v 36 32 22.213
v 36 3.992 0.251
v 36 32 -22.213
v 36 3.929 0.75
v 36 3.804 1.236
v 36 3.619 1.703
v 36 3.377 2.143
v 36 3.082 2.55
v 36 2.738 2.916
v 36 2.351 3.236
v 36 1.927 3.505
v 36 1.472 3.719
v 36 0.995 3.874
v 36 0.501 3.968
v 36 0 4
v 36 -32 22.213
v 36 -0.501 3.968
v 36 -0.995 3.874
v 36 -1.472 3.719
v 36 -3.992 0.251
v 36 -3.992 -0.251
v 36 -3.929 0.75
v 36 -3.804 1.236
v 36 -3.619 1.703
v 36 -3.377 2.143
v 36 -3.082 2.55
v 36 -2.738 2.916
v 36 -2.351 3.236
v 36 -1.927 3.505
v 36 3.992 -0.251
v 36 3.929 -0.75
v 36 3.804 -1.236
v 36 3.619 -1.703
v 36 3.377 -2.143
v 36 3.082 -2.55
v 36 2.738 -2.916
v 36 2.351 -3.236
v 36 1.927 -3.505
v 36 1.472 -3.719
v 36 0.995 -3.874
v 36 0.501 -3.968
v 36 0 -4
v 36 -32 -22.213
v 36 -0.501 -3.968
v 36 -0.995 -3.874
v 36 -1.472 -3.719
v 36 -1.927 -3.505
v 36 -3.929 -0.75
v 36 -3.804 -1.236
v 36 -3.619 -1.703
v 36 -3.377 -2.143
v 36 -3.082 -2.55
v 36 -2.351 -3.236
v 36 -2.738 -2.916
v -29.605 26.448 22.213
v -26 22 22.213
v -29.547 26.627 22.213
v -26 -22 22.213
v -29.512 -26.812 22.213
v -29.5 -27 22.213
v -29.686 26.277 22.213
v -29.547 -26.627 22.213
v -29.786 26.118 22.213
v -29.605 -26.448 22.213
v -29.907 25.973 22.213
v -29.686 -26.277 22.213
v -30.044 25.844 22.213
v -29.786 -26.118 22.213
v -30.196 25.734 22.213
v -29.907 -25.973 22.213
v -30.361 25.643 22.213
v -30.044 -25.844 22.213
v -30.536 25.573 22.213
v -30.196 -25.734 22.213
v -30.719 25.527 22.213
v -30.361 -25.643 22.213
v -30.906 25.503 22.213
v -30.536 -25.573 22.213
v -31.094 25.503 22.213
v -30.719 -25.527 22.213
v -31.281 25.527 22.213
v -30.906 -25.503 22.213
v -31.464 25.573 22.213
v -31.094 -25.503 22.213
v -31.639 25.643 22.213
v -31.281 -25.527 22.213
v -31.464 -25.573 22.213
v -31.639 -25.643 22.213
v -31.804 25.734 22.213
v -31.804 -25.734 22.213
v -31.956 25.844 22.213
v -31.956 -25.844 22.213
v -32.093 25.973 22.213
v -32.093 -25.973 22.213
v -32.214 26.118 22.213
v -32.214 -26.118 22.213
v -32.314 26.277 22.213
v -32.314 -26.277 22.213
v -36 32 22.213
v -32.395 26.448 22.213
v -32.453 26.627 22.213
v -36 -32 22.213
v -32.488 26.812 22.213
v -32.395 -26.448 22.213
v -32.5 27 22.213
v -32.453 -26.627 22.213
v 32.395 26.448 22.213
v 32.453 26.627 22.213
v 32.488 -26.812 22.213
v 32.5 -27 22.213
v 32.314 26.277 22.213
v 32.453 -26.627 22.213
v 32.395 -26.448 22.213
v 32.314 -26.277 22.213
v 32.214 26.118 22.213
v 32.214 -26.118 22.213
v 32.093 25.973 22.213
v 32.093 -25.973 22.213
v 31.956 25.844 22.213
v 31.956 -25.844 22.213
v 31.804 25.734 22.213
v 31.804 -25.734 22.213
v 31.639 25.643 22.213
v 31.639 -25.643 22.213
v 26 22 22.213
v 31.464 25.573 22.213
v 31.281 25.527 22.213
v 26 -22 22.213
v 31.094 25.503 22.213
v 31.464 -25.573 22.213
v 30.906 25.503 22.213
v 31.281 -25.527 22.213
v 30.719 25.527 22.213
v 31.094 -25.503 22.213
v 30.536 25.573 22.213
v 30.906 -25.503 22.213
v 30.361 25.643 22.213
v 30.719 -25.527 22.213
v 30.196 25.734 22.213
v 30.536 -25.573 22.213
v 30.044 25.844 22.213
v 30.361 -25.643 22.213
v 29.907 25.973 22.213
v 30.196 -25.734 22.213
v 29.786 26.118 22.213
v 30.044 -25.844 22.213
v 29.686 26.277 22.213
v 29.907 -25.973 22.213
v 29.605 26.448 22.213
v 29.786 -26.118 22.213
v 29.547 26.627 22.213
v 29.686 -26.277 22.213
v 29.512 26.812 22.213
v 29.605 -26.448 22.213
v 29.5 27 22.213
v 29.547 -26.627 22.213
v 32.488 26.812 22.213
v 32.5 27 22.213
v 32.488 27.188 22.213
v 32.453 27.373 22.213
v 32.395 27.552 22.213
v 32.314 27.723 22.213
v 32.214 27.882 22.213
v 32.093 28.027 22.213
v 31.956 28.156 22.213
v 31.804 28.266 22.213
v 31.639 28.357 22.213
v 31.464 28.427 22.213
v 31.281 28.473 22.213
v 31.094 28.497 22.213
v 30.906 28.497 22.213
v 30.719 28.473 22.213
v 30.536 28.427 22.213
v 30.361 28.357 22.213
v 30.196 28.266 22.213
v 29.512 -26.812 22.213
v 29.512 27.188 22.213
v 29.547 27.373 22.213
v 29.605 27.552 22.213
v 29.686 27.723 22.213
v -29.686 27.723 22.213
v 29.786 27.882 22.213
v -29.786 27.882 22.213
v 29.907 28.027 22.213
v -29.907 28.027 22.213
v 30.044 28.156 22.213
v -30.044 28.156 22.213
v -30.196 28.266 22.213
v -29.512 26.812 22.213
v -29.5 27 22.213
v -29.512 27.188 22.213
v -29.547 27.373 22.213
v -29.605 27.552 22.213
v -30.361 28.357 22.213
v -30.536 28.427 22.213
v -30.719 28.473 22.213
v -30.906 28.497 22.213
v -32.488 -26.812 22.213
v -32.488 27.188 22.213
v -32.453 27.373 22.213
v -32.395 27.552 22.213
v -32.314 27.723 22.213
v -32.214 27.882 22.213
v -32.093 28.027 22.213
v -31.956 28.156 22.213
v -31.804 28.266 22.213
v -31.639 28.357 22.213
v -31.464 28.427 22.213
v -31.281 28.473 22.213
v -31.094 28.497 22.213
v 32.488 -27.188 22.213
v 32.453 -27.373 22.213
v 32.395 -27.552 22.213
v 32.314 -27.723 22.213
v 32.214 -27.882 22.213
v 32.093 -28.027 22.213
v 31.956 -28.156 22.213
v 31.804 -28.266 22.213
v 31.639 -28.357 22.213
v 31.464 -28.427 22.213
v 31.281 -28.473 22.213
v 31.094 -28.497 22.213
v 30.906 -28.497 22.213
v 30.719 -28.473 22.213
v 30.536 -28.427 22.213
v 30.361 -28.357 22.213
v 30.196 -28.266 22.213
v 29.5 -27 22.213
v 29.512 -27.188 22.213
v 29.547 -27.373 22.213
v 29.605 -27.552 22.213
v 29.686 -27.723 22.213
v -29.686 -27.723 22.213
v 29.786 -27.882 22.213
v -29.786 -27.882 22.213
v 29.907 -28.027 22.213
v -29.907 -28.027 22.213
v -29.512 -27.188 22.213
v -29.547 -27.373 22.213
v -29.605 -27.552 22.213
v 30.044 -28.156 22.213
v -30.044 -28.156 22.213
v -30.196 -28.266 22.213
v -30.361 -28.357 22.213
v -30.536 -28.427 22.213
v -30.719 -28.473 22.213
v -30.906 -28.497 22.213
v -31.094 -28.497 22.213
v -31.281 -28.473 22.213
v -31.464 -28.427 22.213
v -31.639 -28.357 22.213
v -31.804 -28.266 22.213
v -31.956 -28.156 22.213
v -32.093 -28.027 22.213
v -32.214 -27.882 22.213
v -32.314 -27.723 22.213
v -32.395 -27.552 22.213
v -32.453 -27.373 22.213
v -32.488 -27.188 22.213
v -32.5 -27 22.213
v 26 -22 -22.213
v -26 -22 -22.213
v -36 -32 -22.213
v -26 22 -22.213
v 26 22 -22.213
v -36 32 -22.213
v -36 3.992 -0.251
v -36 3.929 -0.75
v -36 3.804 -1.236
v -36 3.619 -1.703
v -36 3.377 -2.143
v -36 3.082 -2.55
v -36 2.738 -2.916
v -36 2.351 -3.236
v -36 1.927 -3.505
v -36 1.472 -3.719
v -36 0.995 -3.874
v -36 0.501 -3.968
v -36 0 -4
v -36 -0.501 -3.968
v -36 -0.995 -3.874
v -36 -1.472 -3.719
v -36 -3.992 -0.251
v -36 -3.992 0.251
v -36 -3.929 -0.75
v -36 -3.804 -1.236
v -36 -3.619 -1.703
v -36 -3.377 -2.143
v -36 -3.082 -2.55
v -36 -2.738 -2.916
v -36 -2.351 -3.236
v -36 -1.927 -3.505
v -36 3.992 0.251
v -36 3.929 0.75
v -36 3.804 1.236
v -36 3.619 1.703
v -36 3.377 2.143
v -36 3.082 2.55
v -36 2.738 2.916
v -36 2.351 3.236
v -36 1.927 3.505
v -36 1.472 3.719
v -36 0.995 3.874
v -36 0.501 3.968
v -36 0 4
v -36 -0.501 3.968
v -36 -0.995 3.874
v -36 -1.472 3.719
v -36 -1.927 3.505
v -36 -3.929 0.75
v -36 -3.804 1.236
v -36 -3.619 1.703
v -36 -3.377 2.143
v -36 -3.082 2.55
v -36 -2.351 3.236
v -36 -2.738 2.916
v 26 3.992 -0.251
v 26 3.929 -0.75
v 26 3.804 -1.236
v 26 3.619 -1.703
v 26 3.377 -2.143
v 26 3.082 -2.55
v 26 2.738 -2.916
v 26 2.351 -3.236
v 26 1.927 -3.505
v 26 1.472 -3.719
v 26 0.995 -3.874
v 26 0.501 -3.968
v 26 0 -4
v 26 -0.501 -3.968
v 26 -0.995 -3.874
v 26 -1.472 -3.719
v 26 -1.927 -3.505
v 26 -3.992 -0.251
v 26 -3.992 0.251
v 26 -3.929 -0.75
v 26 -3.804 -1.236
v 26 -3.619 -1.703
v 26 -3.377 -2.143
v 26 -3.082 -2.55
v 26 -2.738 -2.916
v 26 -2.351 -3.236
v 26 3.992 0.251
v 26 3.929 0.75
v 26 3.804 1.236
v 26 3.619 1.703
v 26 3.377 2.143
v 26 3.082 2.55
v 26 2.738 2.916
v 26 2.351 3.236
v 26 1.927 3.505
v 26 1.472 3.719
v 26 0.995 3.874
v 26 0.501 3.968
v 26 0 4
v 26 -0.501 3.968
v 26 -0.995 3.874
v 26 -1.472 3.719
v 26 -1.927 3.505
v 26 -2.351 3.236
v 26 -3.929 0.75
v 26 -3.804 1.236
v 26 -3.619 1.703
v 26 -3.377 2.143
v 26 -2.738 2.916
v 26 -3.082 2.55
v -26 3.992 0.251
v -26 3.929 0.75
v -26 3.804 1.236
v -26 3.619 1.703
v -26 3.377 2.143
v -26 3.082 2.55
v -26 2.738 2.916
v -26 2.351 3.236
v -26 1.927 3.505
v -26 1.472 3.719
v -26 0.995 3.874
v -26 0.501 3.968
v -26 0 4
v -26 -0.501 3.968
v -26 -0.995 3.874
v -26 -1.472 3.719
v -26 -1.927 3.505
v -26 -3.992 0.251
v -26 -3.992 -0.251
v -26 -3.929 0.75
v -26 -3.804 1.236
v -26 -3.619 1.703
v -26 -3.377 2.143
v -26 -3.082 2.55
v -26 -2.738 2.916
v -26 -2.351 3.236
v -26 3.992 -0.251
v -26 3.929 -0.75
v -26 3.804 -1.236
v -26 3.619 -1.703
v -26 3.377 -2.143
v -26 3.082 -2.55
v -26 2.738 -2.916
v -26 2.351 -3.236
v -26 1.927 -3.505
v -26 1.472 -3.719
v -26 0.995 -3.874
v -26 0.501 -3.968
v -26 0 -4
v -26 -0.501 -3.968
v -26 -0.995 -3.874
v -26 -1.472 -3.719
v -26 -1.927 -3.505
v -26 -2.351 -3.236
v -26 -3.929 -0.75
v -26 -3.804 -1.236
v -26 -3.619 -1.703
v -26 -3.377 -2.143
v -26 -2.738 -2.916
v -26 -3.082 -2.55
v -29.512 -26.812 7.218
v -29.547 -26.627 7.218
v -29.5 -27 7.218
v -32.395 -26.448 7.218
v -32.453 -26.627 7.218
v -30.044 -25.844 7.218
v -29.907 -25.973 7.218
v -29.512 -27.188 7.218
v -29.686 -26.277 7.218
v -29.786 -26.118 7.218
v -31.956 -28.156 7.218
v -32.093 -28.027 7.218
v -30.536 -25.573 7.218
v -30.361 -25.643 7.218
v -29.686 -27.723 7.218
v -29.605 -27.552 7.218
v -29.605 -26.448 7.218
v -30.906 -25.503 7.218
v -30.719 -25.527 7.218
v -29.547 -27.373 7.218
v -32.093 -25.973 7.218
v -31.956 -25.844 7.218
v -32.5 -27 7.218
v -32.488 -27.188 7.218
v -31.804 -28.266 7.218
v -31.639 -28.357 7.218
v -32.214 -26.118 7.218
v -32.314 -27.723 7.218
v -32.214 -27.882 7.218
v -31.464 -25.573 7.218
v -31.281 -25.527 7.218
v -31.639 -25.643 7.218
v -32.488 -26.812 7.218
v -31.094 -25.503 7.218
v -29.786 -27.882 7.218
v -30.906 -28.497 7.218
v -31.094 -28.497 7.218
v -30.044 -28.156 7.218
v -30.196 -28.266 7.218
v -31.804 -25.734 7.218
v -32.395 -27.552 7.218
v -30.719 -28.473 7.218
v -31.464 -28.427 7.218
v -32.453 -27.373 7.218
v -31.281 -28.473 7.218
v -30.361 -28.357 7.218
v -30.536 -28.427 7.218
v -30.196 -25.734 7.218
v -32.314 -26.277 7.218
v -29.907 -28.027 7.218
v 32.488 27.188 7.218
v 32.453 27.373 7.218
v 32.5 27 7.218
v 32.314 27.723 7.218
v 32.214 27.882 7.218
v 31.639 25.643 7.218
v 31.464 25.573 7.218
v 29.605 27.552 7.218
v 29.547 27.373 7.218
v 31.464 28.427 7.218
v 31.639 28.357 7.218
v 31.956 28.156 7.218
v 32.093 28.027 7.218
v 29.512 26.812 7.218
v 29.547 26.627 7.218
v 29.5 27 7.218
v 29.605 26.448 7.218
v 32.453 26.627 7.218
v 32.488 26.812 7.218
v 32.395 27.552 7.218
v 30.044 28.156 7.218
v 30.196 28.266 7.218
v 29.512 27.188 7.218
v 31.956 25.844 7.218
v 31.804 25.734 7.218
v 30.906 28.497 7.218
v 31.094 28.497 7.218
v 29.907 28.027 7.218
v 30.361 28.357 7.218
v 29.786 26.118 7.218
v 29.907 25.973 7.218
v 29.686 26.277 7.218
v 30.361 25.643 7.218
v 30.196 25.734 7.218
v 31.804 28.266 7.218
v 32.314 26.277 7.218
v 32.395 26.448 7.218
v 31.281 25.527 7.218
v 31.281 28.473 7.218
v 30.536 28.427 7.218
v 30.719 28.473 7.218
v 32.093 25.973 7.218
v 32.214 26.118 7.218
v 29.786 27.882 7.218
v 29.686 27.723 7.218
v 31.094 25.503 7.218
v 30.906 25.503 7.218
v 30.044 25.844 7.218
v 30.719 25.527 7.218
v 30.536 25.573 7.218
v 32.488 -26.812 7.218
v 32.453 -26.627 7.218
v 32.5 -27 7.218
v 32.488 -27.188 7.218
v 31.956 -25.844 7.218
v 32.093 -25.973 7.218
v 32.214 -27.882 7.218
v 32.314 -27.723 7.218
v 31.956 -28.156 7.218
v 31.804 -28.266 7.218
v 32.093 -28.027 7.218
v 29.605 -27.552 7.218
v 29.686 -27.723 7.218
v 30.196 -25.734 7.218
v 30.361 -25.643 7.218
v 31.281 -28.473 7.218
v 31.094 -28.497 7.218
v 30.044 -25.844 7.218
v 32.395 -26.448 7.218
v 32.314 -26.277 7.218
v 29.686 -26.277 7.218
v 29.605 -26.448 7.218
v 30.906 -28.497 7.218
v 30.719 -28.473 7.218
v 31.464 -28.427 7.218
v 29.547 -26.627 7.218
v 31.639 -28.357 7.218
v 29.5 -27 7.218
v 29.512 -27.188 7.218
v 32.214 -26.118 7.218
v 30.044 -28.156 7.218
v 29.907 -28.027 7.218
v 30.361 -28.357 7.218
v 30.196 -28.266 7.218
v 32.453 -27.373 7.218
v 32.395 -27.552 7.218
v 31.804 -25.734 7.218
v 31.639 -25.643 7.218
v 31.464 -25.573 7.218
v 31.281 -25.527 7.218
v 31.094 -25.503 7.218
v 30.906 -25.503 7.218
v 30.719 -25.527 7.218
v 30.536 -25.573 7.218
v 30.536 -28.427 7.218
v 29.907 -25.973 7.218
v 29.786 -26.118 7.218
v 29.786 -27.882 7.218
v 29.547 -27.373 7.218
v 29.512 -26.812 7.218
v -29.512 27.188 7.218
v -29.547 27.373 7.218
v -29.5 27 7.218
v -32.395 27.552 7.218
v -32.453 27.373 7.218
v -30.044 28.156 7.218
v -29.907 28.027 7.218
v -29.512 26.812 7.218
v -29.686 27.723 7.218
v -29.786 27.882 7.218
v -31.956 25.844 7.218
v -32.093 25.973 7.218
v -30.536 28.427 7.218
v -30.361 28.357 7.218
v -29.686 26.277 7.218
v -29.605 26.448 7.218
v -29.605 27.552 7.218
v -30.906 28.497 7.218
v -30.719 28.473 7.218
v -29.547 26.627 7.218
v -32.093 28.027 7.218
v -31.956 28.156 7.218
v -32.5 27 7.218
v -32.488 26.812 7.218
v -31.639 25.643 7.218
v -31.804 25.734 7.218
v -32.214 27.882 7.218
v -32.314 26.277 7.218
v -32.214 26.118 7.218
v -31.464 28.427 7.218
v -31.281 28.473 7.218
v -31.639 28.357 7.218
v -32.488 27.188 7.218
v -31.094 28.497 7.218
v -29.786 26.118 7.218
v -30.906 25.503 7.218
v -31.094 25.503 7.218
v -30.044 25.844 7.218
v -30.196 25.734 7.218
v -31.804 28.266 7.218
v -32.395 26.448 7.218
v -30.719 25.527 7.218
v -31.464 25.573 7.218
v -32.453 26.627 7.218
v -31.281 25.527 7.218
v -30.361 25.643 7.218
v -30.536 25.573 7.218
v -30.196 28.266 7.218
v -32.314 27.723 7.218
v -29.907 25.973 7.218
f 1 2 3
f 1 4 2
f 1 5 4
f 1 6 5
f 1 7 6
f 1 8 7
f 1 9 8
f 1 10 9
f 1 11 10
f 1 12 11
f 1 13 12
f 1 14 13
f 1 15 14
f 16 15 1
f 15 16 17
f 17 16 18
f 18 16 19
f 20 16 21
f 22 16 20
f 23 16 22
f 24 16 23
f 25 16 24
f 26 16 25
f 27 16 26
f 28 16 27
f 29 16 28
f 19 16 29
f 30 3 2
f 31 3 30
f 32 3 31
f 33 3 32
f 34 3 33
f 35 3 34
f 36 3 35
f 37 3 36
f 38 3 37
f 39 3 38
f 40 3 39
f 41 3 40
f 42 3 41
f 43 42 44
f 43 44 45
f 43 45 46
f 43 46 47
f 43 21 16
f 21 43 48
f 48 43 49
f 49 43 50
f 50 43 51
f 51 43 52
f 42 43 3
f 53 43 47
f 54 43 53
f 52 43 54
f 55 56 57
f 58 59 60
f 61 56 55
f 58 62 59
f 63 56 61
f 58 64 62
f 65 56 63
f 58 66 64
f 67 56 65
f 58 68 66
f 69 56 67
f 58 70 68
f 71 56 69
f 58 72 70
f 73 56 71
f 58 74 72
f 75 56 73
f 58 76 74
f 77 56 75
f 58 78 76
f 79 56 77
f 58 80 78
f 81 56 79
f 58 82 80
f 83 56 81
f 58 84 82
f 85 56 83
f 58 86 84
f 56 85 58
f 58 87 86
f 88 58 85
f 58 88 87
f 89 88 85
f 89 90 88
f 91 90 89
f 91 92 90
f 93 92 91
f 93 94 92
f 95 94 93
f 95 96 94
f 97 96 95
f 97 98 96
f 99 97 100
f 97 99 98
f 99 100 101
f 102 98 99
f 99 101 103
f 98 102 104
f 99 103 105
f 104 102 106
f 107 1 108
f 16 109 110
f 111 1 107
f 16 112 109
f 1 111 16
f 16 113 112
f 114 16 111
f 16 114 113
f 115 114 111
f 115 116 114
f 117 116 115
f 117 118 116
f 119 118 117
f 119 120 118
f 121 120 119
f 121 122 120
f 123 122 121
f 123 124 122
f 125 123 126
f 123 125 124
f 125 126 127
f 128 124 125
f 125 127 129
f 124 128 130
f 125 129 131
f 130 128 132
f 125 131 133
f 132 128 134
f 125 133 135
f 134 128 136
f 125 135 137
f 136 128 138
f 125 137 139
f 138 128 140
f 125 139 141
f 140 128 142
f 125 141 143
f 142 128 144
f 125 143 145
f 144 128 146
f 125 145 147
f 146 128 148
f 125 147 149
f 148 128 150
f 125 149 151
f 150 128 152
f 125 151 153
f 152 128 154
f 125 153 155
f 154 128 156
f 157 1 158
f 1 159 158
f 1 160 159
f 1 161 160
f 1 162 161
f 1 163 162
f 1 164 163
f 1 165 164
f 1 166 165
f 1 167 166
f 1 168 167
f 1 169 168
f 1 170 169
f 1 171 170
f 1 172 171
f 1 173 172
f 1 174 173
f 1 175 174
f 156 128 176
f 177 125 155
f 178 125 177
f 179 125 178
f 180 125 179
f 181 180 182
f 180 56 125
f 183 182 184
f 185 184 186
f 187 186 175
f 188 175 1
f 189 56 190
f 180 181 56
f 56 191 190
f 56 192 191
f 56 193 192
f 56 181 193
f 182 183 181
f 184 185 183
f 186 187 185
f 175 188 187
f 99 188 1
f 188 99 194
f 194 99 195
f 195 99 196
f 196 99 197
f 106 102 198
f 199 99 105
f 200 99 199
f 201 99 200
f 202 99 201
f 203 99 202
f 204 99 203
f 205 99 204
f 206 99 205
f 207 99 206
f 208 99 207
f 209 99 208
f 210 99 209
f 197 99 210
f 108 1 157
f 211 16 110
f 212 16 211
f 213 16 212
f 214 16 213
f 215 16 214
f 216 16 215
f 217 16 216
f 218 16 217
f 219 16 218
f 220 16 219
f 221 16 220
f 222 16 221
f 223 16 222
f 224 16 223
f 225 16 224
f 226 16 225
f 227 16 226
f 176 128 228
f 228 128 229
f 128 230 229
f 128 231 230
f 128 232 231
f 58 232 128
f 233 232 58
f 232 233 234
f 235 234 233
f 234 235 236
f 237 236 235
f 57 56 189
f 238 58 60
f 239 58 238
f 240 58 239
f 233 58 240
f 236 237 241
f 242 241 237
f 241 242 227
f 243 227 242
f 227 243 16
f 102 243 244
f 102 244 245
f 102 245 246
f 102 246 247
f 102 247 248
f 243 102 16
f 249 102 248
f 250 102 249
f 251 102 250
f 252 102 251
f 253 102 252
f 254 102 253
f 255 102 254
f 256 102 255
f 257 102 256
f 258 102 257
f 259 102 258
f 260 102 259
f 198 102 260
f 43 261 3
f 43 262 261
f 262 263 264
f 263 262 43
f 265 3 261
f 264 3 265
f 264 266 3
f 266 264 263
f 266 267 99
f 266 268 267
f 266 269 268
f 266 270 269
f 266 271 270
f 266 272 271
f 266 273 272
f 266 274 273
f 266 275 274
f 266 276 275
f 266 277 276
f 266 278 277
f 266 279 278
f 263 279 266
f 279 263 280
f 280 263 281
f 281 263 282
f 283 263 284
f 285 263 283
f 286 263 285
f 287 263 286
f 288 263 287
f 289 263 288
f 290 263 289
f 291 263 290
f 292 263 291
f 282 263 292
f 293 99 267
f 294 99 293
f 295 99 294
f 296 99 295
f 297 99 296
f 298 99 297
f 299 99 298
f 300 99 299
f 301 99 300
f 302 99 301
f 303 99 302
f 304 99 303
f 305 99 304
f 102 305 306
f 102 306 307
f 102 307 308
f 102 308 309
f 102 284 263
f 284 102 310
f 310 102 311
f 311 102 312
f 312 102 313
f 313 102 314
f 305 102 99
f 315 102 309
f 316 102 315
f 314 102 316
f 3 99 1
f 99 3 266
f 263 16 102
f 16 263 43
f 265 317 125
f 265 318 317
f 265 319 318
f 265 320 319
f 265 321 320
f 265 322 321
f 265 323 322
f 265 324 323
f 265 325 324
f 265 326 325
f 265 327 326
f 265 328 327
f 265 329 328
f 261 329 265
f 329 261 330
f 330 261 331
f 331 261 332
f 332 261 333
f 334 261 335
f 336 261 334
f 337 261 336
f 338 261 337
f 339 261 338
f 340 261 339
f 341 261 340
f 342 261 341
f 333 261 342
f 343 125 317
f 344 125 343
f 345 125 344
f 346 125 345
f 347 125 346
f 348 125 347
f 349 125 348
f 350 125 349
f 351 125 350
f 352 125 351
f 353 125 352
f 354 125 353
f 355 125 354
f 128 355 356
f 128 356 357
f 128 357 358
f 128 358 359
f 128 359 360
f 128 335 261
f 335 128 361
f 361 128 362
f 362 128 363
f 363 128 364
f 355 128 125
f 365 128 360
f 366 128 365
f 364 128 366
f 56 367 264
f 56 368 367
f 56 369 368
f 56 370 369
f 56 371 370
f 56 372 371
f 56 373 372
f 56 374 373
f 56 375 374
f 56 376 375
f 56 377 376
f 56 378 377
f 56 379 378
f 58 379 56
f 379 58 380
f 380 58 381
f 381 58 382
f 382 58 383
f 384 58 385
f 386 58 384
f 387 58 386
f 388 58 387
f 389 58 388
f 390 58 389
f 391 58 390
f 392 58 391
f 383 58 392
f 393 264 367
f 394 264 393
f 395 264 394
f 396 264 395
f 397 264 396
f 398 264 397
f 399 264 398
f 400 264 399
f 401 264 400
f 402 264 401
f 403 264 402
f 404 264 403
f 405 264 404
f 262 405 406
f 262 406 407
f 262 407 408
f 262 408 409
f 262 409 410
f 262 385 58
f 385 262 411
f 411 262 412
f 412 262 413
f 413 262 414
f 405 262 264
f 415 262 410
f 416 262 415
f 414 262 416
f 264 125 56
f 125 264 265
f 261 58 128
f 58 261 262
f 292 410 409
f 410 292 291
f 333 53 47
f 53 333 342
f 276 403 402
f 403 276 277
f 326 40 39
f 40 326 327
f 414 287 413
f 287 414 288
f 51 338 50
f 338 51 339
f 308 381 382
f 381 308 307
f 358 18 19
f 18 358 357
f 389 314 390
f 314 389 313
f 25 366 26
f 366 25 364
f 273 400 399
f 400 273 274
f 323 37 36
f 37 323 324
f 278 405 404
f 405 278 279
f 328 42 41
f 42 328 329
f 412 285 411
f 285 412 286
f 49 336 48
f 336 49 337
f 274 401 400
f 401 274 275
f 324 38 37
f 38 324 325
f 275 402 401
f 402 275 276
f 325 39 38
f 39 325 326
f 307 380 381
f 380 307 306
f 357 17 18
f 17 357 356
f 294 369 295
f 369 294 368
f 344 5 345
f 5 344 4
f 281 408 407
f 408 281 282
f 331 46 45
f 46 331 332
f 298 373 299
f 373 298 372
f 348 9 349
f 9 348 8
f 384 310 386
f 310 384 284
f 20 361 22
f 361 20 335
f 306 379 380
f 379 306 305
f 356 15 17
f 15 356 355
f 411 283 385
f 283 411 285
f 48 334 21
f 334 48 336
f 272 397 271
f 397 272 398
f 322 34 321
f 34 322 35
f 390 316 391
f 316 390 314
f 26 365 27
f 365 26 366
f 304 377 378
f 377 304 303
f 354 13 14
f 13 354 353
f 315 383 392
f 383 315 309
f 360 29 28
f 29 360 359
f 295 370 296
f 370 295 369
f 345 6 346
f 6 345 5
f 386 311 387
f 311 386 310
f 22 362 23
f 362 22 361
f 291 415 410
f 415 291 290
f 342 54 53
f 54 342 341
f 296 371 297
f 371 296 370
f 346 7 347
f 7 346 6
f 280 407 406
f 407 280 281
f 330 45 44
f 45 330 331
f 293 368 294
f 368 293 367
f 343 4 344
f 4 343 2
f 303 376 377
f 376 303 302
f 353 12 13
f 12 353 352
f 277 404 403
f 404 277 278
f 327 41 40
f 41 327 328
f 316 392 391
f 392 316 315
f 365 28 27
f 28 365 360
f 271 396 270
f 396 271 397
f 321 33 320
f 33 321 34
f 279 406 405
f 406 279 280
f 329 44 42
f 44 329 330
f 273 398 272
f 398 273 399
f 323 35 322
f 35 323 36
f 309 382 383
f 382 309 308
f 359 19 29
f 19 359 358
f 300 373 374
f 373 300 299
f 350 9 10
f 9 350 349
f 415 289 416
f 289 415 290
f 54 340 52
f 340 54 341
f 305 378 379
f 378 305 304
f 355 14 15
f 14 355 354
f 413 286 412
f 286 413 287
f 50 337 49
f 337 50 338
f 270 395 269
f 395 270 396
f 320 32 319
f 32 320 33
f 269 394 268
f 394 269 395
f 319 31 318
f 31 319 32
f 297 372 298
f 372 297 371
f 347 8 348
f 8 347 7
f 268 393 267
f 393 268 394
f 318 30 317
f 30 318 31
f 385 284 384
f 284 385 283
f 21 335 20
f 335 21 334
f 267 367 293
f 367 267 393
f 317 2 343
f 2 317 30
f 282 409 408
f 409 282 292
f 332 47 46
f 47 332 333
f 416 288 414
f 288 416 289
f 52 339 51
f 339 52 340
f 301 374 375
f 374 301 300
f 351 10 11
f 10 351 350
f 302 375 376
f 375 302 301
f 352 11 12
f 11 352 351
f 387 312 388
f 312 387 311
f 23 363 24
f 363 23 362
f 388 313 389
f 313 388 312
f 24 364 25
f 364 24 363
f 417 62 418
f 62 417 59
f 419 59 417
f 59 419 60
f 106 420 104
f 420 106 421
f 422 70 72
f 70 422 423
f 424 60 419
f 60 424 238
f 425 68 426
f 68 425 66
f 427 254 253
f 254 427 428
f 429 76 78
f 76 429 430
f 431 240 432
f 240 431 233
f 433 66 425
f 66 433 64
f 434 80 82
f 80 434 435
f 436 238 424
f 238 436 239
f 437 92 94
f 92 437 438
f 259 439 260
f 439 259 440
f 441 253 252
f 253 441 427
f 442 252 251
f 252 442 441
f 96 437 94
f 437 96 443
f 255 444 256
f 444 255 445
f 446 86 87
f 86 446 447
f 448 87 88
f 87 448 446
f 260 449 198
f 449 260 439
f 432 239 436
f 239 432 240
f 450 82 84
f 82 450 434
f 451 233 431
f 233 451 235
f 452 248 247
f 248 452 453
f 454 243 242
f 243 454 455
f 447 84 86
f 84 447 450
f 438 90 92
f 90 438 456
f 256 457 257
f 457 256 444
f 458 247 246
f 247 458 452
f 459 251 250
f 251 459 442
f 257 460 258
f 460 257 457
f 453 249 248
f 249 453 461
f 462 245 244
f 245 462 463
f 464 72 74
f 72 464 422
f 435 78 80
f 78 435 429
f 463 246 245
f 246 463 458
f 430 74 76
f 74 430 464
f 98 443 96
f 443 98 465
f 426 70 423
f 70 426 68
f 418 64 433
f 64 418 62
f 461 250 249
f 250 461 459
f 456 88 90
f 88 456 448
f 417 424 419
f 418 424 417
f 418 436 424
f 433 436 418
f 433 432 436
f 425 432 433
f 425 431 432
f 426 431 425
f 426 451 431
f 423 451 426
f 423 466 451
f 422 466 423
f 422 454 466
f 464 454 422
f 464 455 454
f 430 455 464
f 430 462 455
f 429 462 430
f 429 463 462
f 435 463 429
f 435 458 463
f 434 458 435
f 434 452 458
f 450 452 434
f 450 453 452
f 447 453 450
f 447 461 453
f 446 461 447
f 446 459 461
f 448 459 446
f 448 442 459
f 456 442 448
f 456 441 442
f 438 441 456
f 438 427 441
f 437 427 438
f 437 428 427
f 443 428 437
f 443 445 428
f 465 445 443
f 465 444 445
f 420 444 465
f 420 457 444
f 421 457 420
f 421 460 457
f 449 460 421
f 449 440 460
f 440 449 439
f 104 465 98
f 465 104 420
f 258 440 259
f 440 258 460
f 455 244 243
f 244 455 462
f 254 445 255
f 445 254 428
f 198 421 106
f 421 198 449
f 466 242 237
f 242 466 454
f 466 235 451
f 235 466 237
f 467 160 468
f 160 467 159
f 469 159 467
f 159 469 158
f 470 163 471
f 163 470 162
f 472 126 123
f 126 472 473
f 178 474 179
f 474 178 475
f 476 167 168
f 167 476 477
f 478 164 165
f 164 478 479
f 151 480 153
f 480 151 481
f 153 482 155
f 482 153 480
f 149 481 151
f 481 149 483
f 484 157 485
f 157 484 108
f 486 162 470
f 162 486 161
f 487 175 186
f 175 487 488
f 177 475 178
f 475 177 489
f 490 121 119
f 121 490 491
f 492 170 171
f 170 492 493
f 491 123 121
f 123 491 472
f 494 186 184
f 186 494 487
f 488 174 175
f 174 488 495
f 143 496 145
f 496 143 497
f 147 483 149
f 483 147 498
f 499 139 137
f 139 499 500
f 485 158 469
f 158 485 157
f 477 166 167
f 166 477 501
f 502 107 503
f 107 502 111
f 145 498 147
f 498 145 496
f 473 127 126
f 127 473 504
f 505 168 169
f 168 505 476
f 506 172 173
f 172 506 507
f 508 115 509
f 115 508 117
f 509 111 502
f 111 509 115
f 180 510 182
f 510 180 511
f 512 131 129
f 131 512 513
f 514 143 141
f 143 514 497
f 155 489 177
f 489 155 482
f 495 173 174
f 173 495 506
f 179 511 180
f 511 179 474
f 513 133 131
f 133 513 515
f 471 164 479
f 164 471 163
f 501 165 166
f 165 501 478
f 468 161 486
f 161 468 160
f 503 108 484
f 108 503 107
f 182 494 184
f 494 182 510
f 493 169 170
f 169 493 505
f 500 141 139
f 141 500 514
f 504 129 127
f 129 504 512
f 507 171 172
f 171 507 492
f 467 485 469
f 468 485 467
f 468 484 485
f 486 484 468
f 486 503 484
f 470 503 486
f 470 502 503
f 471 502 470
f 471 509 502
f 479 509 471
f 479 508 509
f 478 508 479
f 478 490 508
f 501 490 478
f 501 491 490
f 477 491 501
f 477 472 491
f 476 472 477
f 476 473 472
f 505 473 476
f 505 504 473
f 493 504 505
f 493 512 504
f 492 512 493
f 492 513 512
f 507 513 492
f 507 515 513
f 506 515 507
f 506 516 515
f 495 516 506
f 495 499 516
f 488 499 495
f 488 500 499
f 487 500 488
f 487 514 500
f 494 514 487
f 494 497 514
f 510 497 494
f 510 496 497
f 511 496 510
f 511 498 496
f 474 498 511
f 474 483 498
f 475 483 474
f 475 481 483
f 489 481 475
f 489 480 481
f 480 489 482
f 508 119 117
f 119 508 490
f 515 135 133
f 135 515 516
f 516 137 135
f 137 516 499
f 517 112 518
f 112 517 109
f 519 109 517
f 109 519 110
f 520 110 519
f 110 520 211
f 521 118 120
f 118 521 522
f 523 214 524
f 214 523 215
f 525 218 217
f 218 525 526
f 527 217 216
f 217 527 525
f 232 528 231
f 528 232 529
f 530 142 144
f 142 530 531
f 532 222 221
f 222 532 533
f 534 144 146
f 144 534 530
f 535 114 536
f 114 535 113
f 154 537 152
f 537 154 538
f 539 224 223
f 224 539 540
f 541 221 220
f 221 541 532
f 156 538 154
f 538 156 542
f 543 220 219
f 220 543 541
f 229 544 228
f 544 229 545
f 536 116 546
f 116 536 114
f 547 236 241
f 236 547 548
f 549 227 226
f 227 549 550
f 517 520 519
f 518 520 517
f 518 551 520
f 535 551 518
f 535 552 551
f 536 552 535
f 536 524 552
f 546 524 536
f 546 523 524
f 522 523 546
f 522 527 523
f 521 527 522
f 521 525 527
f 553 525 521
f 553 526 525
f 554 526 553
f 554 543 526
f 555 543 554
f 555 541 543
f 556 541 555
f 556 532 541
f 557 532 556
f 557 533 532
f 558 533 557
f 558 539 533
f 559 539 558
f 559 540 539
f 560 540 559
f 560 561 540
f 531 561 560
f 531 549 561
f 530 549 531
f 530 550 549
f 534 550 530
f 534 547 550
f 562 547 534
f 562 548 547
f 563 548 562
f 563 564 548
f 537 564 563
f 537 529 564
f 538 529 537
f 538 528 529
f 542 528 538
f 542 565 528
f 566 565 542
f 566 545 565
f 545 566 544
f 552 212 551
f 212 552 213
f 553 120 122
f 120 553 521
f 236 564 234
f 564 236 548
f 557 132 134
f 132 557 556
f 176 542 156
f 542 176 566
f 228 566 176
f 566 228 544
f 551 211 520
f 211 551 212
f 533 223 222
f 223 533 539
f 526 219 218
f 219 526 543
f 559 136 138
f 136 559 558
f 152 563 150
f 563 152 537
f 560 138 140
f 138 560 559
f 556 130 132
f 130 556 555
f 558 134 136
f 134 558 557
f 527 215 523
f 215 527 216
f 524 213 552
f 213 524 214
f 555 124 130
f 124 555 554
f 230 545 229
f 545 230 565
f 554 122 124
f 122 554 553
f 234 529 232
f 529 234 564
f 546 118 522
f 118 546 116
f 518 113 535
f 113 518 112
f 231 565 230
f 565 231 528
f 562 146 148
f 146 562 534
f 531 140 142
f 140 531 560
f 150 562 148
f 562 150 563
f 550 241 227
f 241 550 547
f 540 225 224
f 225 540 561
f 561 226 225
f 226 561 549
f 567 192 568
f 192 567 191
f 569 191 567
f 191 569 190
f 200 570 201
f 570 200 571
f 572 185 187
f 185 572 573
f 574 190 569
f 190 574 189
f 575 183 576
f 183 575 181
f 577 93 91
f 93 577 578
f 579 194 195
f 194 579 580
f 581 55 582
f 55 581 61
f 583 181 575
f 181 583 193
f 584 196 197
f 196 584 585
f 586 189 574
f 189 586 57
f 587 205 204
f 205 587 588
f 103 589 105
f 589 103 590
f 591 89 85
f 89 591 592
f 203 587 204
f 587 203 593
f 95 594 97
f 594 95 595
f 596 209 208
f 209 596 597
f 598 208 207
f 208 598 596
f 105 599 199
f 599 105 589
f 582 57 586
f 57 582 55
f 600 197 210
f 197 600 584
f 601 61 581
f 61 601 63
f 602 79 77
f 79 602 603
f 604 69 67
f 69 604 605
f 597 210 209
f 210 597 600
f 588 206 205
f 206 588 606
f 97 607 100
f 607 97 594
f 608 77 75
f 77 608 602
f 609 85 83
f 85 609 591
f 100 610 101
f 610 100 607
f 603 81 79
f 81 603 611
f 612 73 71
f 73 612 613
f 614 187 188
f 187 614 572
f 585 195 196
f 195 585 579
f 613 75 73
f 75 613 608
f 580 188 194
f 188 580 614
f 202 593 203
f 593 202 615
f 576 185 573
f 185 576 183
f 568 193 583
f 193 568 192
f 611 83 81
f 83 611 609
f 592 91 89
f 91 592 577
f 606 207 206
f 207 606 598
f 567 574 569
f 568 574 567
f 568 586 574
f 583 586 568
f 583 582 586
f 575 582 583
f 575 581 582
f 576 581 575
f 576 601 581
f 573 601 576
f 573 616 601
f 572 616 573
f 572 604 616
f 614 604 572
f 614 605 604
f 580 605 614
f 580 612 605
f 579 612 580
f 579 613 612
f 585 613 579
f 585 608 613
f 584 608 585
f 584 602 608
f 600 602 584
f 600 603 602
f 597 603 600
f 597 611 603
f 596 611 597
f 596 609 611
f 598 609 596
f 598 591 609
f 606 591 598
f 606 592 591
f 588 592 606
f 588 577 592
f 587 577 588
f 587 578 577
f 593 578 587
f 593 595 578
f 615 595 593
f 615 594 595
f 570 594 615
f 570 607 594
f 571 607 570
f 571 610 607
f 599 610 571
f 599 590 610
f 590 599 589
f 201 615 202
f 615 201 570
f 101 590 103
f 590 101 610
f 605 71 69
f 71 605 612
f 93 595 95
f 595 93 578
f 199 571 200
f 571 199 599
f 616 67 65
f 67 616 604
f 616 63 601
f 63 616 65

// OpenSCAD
// file: joystick_defines.scad
/*
	OpenJoystick - A project creating affordable, open source, 3D-printable custom flight-sim joysticks for everyone
	Copyright (C) 2012 Travis John Howse

	This program is free software: you can redistribute it and/or modify
	it under the terms of the GNU General Public License as published by
	the Free Software Foundation, either version 3 of the License, or
	(at your option) any later version.

	This program is distributed in the hope that it will be useful,
	but WITHOUT ANY WARRANTY; without even the implied warranty of
	MERCHANTABILITY or FITNESS FOR A PARTICULAR PURPOSE.  See the
	GNU General Public License for more details.

	You should have received a copy of the GNU General Public License
	along with this program.  If not, see <http://www.gnu.org/licenses/>.
*/

// Standard skate bearing
bearing_inside_dia = 8;
bearing_outside_dia = 22;
bearing_thickness = 7;

// Arbitrary value
shaft_dia = 16;

zff = 0.005;

extrusion_width = 0.8; // Used for single-wall support.

// Set this to 1 to translate everything to printable mode
printable_mode = 0;

// Gimbal core block sizes 
gimbal_core_x = 50;
gimbal_core_y = 30;
gimbal_core_z = gimbal_core_y;

// Gimbal frame sizes 
gimbal_frame_thickness = 10; 

circle_faces = 20;
$fn=circle_faces;

// The 1.8 is 2sin(45)ish, the maximum y on the xy plane the core can occupy
gimbal_frame_x = gimbal_core_x+2*gimbal_frame_thickness+2; // 2mm for washers
gimbal_frame_y = (gimbal_core_y * 1.8)+gimbal_frame_thickness;

// Frame is big enough to stop the core colliding at 45 degree rotation.
gimbal_frame_z = sqrt(pow(gimbal_core_z,2)/2) * 2 + 2; // 2 fudge to allow for clearance at tips.

max_angle = 45; // Not much comes off this, should probably build it in more places.

module bearing(hole,outer_puff)
{
	difference()
	{
		cylinder(h=bearing_thickness, r = (bearing_outside_dia/2)+outer_puff);

		if (hole)
		{
			translate([0,0,-zff])
				cylinder(h=9, r = (bearing_inside_dia/2));
		}
	}
}

// Hat sizes
// Note that many other settings for the hats are in their own .scad, only stuff relevant to the rest of the stick is here.
pb_xy = 6;
pb_z = 4; // Height minus pushbutton
pb_btn_z = 1;
pb_total_z = pb_z+pb_btn_z;
pb_btn_dia = 3.5;
pb_leg_x = 4;
pb_leg_y = 5;
pb_leg_z = 0.7;

lever_switch_x = 12.85;
lever_switch_y = 6.5;
lever_switch_z = 5.8;

4_way_hat_base_dia = 18;
4_way_hat_base_base_z = 1.5; // Base thickness
4_way_hat_base_z = pb_xy + 4_way_hat_base_base_z;
4_way_hat_base_screw_dia = 5;
4_way_hat_base_screw_head_dia = 8.25;
4_way_hat_base_screw_head_thk = 3;
4_way_hat_wire_gap = 3;
4_way_hat_cutout_z = 4_way_hat_base_z + 4_way_hat_base_screw_head_thk;

4_way_hat_peg_stem_hole_z = 4;

// Grip sizes
grip_height = 100;
grip_diameter = 44;
grip_clip = 33;
grip_rest_thickness = 5;
grip_rest_diameter = 80;
grip_cms_height_offset = 50;
grip_cms_offset = -5;
grip_cms_angle = 30;
grip_cms_stub_length = 40;
grip_cms_stub_diameter = 4_way_hat_base_dia;
grip_cms_twist = 15;

grip_head_offset_x = -10;
grip_head_box_x = 4_way_hat_base_dia * 2.5;
grip_head_box_y = 4_way_hat_base_dia * 2.2;
grip_head_box_z = 4_way_hat_base_dia * 2;

joystick_head_trigger_thickness = pb_xy;

my_layer_thickness = 0.35;

joystick_big_btn_height = 8;
joystick_big_btn_diameter = 8.0;
joystick_big_btn_clippyness = 3;

headbolt_x = 10.8;
headbolt_y = -9;
headbolt_z = -11;
headbolt_extra = 8;

module hat_cutout(bloat)
{
	// Very similar to a hat, but it has a cross on the bottom and a peg to indicate where the cables will be run.
	translate([0,0,-4_way_hat_wire_gap-4_way_hat_base_z])
	union()
	{
		translate([0,0,4_way_hat_wire_gap])cylinder(r=(4_way_hat_base_dia/2)*bloat,h=4_way_hat_base_z);
		
		intersection()
		{
			cylinder(r=(4_way_hat_base_dia/2)*bloat,h=4_way_hat_base_z);
			union()
			{
				cube([100, pb_xy, 10],true);
				cube([pb_xy, 100, 10],true);
			}
		}
		translate([0,0,-4_way_hat_base_screw_head_thk+4_way_hat_wire_gap]) cylinder(r=(4_way_hat_base_screw_head_dia/2),h=4_way_hat_base_screw_head_thk,$fn=circle_faces);
	}
}

module pb(puff, legdir)
{
	translate([0,0,pb_z/2])
	{
		// Puff set to 1 if you want a realistic model of a button.
		// Puff variable used for making holes in things bigger than the button size
		cube([pb_xy*puff,pb_xy*puff,pb_z*puff],center=true);
	
		// Button knob itself
		translate([0,0,pb_z/2-zff])
			cylinder(r=(pb_btn_dia/2),h=pb_btn_z,$fn=circle_faces);
	
		// Button legs
		if (legdir == 0)
		{
			translate([0,-pb_xy/2-pb_leg_y/2+zff,-pb_z/2+pb_leg_z/2+0.8])
				cube([pb_xy,pb_leg_y,pb_leg_z],center=true);
		} else {
			translate([0,-pb_xy/2+pb_leg_z/2+zff-pb_leg_z,-pb_z/2-pb_leg_y/2+0.8])
				cube([pb_xy,pb_leg_z,pb_leg_y],center=true);
		}
	}

}

module bolt(cap_r, cap_z, shaft_r, shaft_z,slot_len)
{
	// Hex head bolt for holding head together
	if (shaft_z <= slot_len)
	{
		echo("NO! Don't make the threaded length the same as the total.");
	}
	union()
	{
		cylinder(r=cap_r,h=cap_z);
		translate([0,0,cap_z]) cylinder(r=shaft_r+0.15, h=slot_len);
		translate([0,0,cap_z+slot_len]) cylinder(r=shaft_r, h=shaft_z-slot_len);
	}
}

module fillet(radius, length)
{
	translate([-zff,0,-zff]) difference()
	{
		cube([radius,length,radius]);
		translate([radius,length+zff,radius]) rotate([90,0,0]) cylinder(r=radius,h=length+2*zff);
	}
}
// main file
/*
	OpenJoystick - A project creating affordable, open source, 3D-printable custom flight-sim joysticks for everyone
	Copyright (C) 2012 Travis John Howse

	This program is free software: you can redistribute it and/or modify
	it under the terms of the GNU General Public License as published by
	the Free Software Foundation, either version 3 of the License, or
	(at your option) any later version.

	This program is distributed in the hope that it will be useful,
	but WITHOUT ANY WARRANTY; without even the implied warranty of
	MERCHANTABILITY or FITNESS FOR A PARTICULAR PURPOSE.  See the
	GNU General Public License for more details.

	You should have received a copy of the GNU General Public License
	along with this program.  If not, see <http://www.gnu.org/licenses/>.
*/

include <joystick_defines.scad>

gimbal_frame();

gimbal_frame_bolt_depth = 15;

module gimbal_frame()
{
	difference()
	{
		cube([gimbal_frame_x,gimbal_frame_y,gimbal_frame_z], center=true);
		// Boosted zff right up here, don't know why it's required, but it is.
		translate([0,0,-zff])
			cube([gimbal_frame_x-(2*gimbal_frame_thickness),gimbal_frame_y-(2*gimbal_frame_thickness),gimbal_frame_z + 30*zff], center=true);

		// X rot bearings 
		translate([gimbal_frame_x/2+zff - (gimbal_frame_thickness-bearing_thickness),0,0])
			rotate([0,-90,0])
				bearing();
		translate([-gimbal_frame_x/2-zff + (gimbal_frame_thickness-bearing_thickness),0,0])
			rotate([0,90,0])
				bearing();

		translate([-(gimbal_frame_x/2)-zff,0,0])
			rotate([0,90,0])
				cylinder(h=(gimbal_frame_x+2*zff), r=(bearing_inside_dia/2), $fn=50);
		// Bolt holes 
		translate([-gimbal_frame_x/2 + gimbal_frame_thickness/2, -gimbal_frame_y/2 + gimbal_frame_thickness/2,gimbal_frame_z/2+zff-gimbal_frame_bolt_depth])
			cylinder(r = 1.5, h=gimbal_frame_bolt_depth + zff, $fn=50);
		translate([gimbal_frame_x/2 - gimbal_frame_thickness/2, gimbal_frame_y/2 - gimbal_frame_thickness/2,gimbal_frame_z/2+zff-gimbal_frame_bolt_depth])
			cylinder(r = 1.5, h=gimbal_frame_bolt_depth + zff, $fn=50);
		translate([gimbal_frame_x/2 - gimbal_frame_thickness/2, -gimbal_frame_y/2 + gimbal_frame_thickness/2,gimbal_frame_z/2+zff-gimbal_frame_bolt_depth])
			cylinder(r = 1.5, h=gimbal_frame_bolt_depth + zff, $fn=50);
		translate([-gimbal_frame_x/2 + gimbal_frame_thickness/2, gimbal_frame_y/2 - gimbal_frame_thickness/2,gimbal_frame_z/2+zff-gimbal_frame_bolt_depth])
			cylinder(r = 1.5, h=gimbal_frame_bolt_depth + zff, $fn=50);

	}
}
